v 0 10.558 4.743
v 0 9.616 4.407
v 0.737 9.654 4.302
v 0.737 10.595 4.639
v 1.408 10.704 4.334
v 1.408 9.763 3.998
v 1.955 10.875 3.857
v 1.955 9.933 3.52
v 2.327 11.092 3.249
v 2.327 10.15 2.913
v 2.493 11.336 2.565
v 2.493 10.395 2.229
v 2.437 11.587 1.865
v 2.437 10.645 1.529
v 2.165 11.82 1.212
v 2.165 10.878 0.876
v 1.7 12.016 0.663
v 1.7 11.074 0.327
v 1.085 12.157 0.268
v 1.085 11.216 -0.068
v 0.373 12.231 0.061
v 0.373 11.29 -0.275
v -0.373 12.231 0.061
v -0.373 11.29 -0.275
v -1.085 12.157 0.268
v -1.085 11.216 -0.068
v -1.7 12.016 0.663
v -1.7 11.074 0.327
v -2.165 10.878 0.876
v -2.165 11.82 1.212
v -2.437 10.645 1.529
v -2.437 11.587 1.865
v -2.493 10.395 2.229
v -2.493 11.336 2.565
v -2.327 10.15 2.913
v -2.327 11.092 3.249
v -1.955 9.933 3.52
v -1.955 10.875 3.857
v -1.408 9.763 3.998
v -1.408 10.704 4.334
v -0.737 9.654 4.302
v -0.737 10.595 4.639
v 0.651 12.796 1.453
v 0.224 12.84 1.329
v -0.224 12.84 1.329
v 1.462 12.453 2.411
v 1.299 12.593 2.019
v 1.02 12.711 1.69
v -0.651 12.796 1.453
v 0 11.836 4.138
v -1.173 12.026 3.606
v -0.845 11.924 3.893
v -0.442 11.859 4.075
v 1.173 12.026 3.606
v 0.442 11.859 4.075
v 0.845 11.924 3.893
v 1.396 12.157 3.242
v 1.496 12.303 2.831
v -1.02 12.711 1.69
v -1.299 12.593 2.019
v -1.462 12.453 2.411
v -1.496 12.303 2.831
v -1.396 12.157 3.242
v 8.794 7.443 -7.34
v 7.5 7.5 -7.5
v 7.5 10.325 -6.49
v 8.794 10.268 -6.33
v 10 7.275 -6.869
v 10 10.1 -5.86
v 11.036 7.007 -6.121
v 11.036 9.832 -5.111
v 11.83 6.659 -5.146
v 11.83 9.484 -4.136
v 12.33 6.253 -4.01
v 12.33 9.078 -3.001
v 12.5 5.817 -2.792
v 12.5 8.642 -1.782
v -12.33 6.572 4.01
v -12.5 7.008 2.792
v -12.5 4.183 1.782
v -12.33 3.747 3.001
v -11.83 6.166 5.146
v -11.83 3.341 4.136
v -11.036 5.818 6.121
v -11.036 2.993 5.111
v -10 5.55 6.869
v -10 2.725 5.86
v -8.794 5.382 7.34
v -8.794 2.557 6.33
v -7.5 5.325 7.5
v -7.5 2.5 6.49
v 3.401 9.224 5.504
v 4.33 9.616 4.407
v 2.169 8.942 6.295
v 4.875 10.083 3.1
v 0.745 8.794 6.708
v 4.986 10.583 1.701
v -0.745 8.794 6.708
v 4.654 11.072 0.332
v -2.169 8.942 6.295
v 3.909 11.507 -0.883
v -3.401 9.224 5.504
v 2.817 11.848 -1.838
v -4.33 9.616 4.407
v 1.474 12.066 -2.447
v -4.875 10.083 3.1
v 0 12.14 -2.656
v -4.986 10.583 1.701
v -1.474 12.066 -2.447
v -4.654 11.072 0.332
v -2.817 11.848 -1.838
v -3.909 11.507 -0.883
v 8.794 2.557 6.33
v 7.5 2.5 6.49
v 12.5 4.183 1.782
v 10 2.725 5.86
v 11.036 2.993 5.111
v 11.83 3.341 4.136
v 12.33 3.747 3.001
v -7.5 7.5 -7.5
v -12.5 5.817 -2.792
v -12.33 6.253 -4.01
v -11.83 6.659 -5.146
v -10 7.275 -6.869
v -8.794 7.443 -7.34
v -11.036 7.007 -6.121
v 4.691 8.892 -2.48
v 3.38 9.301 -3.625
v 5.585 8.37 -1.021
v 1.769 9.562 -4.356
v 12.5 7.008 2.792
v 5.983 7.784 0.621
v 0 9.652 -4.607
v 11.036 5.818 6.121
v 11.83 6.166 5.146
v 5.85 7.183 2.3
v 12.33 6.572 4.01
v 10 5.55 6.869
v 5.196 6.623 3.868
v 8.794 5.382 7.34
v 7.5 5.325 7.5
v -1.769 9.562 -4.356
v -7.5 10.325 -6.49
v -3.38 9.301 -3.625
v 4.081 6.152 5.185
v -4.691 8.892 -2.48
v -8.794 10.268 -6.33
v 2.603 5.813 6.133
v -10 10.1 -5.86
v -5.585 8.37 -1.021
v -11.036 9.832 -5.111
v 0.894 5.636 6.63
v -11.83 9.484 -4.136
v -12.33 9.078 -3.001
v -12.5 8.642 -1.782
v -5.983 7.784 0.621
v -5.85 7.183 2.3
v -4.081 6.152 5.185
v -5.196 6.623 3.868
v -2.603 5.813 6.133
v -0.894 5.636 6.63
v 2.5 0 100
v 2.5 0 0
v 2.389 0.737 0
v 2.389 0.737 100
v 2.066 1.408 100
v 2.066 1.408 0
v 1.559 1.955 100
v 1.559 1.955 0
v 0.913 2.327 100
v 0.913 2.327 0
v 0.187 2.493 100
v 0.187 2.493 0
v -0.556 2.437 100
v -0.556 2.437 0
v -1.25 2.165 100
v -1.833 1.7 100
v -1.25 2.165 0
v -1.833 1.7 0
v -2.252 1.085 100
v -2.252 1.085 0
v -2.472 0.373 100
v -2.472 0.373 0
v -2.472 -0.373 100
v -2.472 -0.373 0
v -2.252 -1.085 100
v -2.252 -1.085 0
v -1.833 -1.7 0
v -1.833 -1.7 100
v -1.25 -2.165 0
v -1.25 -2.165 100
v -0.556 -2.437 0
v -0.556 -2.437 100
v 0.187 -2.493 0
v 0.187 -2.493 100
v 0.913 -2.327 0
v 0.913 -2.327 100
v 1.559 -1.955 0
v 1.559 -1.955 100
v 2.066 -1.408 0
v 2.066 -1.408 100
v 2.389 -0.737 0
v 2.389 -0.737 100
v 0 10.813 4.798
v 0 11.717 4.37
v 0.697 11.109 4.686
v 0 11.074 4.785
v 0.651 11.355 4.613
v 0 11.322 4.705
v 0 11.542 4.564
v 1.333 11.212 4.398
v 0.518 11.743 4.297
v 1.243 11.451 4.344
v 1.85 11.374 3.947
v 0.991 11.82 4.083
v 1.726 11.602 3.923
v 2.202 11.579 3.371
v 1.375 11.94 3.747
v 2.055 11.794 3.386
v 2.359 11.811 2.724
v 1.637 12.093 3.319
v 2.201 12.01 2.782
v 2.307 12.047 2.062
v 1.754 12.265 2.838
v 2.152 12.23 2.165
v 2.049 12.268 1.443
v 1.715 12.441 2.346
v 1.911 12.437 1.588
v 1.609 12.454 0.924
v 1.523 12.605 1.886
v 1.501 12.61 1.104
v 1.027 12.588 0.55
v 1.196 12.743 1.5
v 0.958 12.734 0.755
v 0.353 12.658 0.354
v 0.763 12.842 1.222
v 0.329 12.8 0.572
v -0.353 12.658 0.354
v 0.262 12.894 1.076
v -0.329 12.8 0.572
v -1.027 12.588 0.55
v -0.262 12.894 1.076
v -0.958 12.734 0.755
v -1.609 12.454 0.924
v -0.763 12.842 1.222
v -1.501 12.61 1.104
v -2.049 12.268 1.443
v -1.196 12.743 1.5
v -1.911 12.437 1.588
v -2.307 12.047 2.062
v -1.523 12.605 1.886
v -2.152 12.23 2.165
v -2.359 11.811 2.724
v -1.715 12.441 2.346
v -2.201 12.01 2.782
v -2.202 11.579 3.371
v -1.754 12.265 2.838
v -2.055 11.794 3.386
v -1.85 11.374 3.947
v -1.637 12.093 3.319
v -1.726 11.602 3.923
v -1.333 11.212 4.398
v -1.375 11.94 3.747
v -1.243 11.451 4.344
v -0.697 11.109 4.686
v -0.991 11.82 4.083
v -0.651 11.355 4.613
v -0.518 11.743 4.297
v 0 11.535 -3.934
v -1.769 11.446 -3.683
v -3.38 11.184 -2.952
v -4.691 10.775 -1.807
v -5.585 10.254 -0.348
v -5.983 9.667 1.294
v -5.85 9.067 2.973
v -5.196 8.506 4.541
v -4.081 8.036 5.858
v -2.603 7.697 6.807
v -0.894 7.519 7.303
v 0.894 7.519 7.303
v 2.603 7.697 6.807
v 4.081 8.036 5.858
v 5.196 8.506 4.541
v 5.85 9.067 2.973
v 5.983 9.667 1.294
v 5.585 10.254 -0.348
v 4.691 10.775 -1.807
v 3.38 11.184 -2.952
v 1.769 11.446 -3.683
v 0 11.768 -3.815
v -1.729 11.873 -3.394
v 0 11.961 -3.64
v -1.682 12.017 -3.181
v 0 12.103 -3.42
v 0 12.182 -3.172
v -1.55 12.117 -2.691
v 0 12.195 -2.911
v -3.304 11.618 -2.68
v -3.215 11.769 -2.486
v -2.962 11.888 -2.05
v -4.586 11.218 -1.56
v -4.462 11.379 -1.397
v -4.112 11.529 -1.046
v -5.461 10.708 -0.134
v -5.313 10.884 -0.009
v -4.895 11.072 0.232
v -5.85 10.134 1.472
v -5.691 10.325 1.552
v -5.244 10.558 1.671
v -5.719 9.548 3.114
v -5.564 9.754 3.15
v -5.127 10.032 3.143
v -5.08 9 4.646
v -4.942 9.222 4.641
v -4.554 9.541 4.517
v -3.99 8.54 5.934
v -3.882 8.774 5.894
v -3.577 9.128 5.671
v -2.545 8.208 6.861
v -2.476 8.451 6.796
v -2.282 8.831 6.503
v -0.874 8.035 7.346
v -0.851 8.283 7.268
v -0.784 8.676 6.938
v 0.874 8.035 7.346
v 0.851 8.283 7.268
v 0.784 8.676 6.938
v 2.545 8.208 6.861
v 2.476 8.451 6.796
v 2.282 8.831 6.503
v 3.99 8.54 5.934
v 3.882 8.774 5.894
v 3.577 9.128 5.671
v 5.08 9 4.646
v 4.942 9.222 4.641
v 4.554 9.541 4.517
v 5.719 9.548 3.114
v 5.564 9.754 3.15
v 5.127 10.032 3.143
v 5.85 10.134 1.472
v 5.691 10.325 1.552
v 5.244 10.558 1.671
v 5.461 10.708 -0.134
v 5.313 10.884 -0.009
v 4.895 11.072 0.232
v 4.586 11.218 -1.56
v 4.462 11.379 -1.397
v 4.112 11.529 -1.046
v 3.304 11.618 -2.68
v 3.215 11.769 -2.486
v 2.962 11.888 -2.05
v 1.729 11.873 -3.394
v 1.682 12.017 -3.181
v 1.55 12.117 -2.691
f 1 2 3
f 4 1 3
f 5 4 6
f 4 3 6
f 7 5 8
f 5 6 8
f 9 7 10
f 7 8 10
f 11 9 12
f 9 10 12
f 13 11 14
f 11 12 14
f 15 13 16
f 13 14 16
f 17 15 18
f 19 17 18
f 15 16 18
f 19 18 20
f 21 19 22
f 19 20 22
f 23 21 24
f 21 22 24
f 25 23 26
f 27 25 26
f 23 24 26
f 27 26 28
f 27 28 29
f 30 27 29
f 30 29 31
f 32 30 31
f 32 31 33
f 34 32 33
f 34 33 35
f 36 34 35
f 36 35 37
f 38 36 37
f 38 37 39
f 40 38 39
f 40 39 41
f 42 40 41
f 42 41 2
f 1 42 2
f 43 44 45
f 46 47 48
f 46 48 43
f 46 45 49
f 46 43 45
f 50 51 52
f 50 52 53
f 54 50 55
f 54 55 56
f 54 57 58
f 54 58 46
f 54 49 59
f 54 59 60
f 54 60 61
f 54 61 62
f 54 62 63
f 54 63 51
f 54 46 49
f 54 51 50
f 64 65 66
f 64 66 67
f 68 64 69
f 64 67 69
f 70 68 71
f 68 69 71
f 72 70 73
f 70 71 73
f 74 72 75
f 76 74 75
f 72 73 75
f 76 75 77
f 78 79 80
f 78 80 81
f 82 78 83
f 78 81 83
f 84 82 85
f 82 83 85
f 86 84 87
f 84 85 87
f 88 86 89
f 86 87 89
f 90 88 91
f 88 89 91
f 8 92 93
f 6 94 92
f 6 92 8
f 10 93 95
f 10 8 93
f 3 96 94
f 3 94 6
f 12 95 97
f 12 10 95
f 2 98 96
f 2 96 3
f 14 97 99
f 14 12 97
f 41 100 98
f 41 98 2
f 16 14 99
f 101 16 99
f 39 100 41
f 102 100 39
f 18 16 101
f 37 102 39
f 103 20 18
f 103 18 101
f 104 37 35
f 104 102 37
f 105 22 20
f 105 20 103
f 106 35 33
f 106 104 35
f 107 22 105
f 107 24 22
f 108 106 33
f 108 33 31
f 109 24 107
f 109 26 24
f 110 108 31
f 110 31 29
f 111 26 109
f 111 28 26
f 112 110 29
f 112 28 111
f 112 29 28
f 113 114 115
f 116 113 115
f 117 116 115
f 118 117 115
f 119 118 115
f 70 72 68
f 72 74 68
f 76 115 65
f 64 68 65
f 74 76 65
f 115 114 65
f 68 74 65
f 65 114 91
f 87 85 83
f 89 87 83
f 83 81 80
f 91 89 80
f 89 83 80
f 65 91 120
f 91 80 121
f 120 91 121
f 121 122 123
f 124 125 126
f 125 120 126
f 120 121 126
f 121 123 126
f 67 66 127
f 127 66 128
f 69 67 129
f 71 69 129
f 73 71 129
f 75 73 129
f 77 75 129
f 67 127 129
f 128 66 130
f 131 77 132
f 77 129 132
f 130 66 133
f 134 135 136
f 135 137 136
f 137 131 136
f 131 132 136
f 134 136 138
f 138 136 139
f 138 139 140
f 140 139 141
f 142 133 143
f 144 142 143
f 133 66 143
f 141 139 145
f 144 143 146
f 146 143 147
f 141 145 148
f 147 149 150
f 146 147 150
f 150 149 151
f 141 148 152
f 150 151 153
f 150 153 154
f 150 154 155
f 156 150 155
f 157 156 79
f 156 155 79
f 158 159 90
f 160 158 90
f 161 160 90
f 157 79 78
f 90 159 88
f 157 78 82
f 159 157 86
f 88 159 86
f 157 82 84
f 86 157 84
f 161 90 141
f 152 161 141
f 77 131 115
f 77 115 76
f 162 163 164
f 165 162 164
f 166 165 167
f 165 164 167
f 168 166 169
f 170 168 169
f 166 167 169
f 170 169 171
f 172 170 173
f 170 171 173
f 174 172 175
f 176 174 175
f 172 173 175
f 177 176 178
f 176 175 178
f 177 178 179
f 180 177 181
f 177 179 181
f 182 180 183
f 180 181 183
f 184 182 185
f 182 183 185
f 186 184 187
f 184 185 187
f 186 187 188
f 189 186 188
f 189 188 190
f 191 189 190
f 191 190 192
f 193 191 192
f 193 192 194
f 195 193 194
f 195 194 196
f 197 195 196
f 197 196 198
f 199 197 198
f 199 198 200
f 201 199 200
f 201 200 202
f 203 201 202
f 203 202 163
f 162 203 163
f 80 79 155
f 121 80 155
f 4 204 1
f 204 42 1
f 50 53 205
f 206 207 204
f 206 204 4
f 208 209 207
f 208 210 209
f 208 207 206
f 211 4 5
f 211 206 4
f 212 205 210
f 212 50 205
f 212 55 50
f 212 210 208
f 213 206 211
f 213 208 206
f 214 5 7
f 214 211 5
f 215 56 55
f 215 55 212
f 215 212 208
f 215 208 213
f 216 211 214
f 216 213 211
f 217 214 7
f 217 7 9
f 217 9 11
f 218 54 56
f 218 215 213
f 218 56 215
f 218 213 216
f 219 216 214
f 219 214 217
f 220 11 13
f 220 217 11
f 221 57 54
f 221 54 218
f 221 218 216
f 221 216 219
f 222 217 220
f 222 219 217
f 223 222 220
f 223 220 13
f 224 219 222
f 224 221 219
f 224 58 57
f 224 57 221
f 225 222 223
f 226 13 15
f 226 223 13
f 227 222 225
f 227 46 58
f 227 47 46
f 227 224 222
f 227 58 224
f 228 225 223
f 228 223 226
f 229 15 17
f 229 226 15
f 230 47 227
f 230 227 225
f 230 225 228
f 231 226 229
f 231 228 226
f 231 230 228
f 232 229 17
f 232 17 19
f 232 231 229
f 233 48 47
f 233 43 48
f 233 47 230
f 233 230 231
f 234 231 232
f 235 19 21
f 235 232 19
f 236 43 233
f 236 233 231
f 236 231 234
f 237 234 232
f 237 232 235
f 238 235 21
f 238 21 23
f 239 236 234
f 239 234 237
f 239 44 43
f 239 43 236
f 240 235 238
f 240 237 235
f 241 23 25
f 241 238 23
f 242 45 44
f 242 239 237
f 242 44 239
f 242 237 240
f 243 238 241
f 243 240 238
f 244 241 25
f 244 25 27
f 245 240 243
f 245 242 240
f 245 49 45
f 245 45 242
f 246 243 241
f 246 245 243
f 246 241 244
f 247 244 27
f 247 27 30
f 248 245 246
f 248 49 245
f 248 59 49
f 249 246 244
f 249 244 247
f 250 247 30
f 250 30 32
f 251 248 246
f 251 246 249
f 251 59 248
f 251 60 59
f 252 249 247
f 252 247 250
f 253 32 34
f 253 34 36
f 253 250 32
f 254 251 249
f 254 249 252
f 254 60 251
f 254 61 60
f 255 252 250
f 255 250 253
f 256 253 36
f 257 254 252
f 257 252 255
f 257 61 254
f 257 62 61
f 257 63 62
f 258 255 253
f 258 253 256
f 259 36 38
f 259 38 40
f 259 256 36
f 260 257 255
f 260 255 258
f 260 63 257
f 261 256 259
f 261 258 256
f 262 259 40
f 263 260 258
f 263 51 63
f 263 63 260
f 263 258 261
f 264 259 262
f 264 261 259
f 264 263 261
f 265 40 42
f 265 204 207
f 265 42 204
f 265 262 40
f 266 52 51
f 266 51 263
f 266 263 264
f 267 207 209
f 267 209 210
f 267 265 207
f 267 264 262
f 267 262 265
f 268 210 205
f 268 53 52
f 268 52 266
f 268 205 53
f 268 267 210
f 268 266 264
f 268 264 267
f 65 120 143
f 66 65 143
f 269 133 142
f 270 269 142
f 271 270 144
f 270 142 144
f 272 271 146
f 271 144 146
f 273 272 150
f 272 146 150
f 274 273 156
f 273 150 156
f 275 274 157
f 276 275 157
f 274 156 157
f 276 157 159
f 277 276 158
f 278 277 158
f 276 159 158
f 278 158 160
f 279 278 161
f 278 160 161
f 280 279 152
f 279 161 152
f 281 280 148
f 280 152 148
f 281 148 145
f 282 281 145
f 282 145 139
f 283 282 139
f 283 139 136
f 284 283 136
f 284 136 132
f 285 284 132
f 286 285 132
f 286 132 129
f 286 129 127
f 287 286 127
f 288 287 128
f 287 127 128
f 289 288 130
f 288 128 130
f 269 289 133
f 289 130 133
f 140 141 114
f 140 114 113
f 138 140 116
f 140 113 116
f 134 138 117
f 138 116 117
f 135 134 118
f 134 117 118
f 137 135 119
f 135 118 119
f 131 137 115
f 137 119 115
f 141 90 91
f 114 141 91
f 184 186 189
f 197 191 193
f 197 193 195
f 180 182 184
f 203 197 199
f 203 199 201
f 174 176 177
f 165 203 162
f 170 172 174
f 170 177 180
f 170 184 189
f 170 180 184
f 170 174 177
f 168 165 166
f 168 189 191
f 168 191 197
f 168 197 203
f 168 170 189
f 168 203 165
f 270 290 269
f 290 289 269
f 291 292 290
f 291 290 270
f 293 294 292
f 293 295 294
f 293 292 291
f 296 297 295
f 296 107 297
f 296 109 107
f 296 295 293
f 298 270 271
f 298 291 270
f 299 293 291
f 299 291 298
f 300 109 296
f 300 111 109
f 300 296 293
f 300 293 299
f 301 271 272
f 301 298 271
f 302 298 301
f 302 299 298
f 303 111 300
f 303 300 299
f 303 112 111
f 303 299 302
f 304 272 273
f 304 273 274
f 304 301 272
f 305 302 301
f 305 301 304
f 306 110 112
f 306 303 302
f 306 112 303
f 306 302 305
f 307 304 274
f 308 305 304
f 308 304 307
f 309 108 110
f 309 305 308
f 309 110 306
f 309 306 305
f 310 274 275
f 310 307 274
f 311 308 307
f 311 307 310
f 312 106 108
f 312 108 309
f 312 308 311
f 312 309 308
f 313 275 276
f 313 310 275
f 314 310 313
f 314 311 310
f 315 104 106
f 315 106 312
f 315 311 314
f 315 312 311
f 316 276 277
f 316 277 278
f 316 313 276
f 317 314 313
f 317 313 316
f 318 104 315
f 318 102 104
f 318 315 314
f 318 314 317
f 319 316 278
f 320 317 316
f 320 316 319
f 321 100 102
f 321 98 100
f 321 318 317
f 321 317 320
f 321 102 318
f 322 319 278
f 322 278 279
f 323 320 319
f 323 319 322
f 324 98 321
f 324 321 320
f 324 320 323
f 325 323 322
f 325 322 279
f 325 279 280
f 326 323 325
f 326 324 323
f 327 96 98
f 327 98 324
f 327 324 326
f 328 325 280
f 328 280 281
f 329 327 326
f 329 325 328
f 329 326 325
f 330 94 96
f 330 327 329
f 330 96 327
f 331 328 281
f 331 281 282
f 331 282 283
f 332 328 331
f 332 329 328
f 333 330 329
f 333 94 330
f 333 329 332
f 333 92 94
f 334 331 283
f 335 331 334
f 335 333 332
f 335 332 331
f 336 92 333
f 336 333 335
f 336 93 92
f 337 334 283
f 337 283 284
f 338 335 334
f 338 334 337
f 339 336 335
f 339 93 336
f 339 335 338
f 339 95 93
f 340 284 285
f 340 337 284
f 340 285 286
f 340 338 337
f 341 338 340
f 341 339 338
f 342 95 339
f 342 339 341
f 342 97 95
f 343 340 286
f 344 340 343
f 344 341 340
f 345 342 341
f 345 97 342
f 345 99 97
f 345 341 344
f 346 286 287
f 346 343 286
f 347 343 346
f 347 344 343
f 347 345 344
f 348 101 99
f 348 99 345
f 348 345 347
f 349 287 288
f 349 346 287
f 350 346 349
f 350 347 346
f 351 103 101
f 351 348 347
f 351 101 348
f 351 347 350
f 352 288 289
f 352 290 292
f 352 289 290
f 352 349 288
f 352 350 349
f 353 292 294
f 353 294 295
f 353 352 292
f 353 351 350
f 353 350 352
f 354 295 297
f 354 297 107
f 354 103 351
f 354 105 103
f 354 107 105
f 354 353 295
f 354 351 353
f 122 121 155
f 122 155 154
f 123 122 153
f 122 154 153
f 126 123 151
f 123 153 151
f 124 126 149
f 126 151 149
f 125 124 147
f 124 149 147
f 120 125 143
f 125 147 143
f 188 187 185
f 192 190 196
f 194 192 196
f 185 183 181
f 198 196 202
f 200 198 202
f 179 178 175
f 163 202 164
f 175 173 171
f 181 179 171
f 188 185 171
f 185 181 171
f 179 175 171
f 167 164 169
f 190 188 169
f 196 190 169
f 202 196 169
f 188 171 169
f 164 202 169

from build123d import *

# Parameters (mm, degrees)
SKETCH_1_R          = 2.5
EXTRUDE_1_DEPTH     = 100
SKETCH_2_W          = 25
SKETCH_2_H          = 15
EXTRUDE_2_DEPTH     = 15
CUT_EXTRUDE_1_DEPTH = 105.16333328
CUT_EXTRUDE_3_DEPTH = 104.593463815
SKETCH_1_2_R        = 2.5
EXTRUDE_3_DEPTH     = 20
SKETCH_5_R          = 6
EXTRUDE_4_DEPTH     = 3
SKETCH_5_3_R        = 2.5
EXTRUDE_5_DEPTH     = 5
FILLET_1_R          = 5
FILLET_2_R          = 1
FILLET_3_R          = 1


with BuildPart() as part:
    # 草图1 → 凸台-拉伸1 (new body)
    with BuildSketch(Plane.XY):
        Circle(SKETCH_1_R)
    extrude(amount=EXTRUDE_1_DEPTH)

    # 草图2 → 凸台-拉伸2 (add)
    with BuildSketch(Plane(origin=(0, 0, 0), x_dir=(1, 0, 0), z_dir=(0, 1, 0))):
        Rectangle(SKETCH_2_W, SKETCH_2_H)
    extrude(amount=EXTRUDE_2_DEPTH)

    # 草图4 → 切除-拉伸1 (cut, through all)
    with BuildSketch(Plane.ZY.offset(12.5)):
        Polygon((-7.5, 7.5), (-6.490375252, 10.325005817), (7.5, 5.325005817), (7.5, 15), (-7.5, 15), align=None)
        Polygon((7.5, 5.325005817), (6.490375252, 2.5), (7.5, 2.13917167), align=None)
    extrude(amount=-CUT_EXTRUDE_1_DEPTH, mode=Mode.SUBTRACT)

    # 草图4<3> → 切除-拉伸3 (cut, through all)
    with BuildSketch(Plane.ZY.offset(12.5)):
        Polygon((6.490375252, 2.5), (-7.5, 7.5), (-7.5, 0), (7.5, 0), (7.5, 2.13917167), align=None)
    extrude(amount=-CUT_EXTRUDE_3_DEPTH, mode=Mode.SUBTRACT)


with BuildPart() as cut_extrude_3_piece_1:
    # of the separate pieces the step leaves, piece 1, a body of its own (cut_extrude_3_pieces)
    add(part.part.solids().sort_by_distance((2.5, 0, 0))[0])

    # 草图1<2> → 凸台-拉伸3 (add)
    with BuildSketch(Plane.XY):
        Circle(SKETCH_1_2_R)
    extrude(amount=EXTRUDE_3_DEPTH)


with BuildPart() as cut_extrude_3_piece_2:
    # of the separate pieces the step leaves, piece 2, a body of its own (cut_extrude_3_pieces)
    add(part.part.solids().sort_by_distance((-12.5, 7.5, -7.5))[0])

    # 草图5 → 凸台-拉伸4 (add)
    with BuildSketch(Plane(origin=(0, 7.098724219, 2.537002793), x_dir=(1, 0, 0), z_dir=(0, 0.9416686058037751, 0.33654158263663997))):
        with Locations((0, 1.586576413)):
            Circle(SKETCH_5_R)
    extrude(amount=EXTRUDE_4_DEPTH)

    # 草图5<3> → 凸台-拉伸5 (add)
    with BuildSketch(Plane(origin=(0, 7.098724219, 2.537002793), x_dir=(1, 0, 0), z_dir=(0, 0.9416686058037751, 0.33654158263663997))):
        with Locations((0, 1.586576413)):
            Circle(SKETCH_5_3_R)
    extrude(amount=EXTRUDE_5_DEPTH)

    # 圆角1
    fillet_1_edges = [cut_extrude_3_piece_2.edges().sort_by_distance(p)[0] for p in [
        (12.5, 8.912502909, -6.995187626),
        (12.5, 3.912502909, 6.995187626),
        (-12.5, 8.912502909, -6.995187626),
        (-12.5, 3.912502909, 6.995187626),
    ]]
    fillet(fillet_1_edges, radius=FILLET_1_R)

    # 圆角2
    fillet_2_edges = [cut_extrude_3_piece_2.edges().sort_by_distance(p)[0] for p in [
        (-6, 10.457678974, 2.052598342),
    ]]
    fillet(fillet_2_edges, radius=FILLET_2_R)

    # 圆角3
    fillet_3_edges = [cut_extrude_3_piece_2.edges().sort_by_distance(p)[0] for p in [
        (-2.5, 12.341016185, 2.725681508),
    ]]
    fillet(fillet_3_edges, radius=FILLET_3_R)


solid = Compound([cut_extrude_3_piece_1.part, cut_extrude_3_piece_2.part])
